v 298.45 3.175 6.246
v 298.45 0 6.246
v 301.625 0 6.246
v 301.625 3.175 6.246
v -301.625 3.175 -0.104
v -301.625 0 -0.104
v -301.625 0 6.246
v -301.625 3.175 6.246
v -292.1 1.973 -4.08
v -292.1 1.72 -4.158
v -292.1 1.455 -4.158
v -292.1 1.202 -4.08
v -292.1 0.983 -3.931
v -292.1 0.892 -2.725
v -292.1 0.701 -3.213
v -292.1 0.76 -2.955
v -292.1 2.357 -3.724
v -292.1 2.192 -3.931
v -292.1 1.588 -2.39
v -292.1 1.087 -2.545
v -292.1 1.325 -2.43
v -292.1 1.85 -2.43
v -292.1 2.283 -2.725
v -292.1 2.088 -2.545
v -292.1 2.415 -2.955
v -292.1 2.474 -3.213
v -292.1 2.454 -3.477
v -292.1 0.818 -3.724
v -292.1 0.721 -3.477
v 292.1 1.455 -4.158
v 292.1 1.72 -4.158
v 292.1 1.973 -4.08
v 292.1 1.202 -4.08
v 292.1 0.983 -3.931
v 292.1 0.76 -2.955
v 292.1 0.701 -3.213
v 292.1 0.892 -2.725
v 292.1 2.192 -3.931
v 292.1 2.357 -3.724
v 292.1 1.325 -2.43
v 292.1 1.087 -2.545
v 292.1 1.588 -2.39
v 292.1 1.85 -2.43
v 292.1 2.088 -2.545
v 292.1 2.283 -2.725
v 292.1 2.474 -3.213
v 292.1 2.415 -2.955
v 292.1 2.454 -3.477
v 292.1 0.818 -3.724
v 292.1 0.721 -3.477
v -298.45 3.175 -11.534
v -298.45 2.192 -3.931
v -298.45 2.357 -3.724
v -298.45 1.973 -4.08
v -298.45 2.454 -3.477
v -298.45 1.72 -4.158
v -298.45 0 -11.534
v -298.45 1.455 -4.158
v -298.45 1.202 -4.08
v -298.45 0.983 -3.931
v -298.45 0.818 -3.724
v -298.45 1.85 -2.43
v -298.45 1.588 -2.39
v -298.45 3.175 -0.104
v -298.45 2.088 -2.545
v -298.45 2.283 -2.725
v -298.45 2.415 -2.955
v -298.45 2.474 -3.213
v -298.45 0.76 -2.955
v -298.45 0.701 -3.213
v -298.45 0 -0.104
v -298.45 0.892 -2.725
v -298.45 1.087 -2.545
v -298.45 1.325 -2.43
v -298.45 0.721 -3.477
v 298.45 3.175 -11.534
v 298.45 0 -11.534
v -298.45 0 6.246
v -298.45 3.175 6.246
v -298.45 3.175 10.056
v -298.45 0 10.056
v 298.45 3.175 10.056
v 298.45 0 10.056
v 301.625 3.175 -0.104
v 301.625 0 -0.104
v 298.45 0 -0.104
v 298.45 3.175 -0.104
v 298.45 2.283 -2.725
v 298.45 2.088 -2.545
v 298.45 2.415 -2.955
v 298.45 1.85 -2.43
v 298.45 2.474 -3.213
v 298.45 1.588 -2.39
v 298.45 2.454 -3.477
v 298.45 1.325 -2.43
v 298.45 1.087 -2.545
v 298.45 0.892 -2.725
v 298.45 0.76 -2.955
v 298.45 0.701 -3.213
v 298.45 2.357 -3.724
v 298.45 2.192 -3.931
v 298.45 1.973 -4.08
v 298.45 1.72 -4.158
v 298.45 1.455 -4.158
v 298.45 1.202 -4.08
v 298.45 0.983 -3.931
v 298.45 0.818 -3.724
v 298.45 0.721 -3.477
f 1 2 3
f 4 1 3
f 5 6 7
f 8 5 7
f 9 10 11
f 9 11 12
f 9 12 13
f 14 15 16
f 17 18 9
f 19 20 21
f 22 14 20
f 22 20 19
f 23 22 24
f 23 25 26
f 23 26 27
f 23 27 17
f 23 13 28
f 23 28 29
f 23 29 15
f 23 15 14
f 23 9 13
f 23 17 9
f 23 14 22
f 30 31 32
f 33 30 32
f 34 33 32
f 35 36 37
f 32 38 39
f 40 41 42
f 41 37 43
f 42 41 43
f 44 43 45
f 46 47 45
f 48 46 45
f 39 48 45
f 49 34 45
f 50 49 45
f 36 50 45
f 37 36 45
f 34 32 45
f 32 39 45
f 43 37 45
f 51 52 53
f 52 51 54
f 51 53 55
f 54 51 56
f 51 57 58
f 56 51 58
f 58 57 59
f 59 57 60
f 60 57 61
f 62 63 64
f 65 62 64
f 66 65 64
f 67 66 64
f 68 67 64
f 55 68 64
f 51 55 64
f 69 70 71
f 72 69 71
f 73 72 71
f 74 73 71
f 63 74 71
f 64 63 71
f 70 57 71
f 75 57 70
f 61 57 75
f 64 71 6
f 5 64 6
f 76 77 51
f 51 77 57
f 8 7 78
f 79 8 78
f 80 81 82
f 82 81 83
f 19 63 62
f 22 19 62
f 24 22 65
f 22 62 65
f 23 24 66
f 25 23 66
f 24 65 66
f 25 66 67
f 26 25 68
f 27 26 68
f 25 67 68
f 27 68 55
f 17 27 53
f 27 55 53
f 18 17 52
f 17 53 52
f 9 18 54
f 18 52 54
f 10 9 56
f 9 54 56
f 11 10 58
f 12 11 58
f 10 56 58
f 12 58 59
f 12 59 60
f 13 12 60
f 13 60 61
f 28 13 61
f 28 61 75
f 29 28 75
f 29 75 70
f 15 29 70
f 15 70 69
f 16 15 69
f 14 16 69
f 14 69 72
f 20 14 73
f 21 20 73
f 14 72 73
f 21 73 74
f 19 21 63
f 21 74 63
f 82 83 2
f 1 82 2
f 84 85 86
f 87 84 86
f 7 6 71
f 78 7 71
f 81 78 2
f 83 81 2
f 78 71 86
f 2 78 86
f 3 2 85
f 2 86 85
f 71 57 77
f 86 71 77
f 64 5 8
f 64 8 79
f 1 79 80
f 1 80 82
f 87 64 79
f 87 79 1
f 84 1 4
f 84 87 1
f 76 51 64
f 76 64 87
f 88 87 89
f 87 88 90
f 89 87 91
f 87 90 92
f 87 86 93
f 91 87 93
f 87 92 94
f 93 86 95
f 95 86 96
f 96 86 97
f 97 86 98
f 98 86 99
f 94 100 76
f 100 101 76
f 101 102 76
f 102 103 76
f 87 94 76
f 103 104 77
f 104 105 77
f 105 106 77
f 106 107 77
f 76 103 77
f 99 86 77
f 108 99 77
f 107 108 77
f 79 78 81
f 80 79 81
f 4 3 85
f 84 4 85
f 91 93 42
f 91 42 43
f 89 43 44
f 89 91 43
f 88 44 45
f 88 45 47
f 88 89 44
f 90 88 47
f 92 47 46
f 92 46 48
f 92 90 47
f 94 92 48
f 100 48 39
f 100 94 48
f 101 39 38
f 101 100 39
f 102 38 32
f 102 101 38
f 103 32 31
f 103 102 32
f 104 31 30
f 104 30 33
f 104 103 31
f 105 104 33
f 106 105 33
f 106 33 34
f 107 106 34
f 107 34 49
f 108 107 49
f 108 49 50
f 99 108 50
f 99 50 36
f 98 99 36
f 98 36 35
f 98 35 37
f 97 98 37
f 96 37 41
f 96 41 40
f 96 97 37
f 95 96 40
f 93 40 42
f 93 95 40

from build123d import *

# Parameters (mm, degrees)
BOSS_EXTRUDE1_DEPTH = 3.175
SKETCH2_R           = 0.889
CUT_EXTRUDE1_DEPTH  = 6.35


with BuildPart() as part:
    # Sketch1 → Boss-Extrude1 (new body)
    with BuildSketch(Plane(origin=(0, 0, 0), x_dir=(1, 0, 0), z_dir=(0, 1, 0))):
        Polygon((-298.45, -6.245695132), (-298.45, -10.055695132), (298.45, -10.055695132), (298.45, -6.245695132), (301.625, -6.245695132), (301.625, 0.104304868), (298.45, 0.104304868), (298.45, 11.534304868), (-298.45, 11.534304868), (-298.45, 0.104304868), (-301.625, 0.104304868), (-301.625, -6.245695132), align=None)
    extrude(amount=BOSS_EXTRUDE1_DEPTH)

    # Sketch2 → Cut-Extrude1 (cut)
    with BuildSketch(Plane.ZY.offset(298.45)):
        with Locations((-3.279304868, 1.5875)):
            Circle(SKETCH2_R)
    cut_extrude1 = extrude(amount=-CUT_EXTRUDE1_DEPTH, mode=Mode.SUBTRACT)

    # Mirror1: Cut-Extrude1 across plane
    add(cut_extrude1.mirror(Plane(origin=(0, 0, 0), x_dir=(0, 0, 1), z_dir=(1, 0, 0))), mode=Mode.SUBTRACT)


solid = part.part
